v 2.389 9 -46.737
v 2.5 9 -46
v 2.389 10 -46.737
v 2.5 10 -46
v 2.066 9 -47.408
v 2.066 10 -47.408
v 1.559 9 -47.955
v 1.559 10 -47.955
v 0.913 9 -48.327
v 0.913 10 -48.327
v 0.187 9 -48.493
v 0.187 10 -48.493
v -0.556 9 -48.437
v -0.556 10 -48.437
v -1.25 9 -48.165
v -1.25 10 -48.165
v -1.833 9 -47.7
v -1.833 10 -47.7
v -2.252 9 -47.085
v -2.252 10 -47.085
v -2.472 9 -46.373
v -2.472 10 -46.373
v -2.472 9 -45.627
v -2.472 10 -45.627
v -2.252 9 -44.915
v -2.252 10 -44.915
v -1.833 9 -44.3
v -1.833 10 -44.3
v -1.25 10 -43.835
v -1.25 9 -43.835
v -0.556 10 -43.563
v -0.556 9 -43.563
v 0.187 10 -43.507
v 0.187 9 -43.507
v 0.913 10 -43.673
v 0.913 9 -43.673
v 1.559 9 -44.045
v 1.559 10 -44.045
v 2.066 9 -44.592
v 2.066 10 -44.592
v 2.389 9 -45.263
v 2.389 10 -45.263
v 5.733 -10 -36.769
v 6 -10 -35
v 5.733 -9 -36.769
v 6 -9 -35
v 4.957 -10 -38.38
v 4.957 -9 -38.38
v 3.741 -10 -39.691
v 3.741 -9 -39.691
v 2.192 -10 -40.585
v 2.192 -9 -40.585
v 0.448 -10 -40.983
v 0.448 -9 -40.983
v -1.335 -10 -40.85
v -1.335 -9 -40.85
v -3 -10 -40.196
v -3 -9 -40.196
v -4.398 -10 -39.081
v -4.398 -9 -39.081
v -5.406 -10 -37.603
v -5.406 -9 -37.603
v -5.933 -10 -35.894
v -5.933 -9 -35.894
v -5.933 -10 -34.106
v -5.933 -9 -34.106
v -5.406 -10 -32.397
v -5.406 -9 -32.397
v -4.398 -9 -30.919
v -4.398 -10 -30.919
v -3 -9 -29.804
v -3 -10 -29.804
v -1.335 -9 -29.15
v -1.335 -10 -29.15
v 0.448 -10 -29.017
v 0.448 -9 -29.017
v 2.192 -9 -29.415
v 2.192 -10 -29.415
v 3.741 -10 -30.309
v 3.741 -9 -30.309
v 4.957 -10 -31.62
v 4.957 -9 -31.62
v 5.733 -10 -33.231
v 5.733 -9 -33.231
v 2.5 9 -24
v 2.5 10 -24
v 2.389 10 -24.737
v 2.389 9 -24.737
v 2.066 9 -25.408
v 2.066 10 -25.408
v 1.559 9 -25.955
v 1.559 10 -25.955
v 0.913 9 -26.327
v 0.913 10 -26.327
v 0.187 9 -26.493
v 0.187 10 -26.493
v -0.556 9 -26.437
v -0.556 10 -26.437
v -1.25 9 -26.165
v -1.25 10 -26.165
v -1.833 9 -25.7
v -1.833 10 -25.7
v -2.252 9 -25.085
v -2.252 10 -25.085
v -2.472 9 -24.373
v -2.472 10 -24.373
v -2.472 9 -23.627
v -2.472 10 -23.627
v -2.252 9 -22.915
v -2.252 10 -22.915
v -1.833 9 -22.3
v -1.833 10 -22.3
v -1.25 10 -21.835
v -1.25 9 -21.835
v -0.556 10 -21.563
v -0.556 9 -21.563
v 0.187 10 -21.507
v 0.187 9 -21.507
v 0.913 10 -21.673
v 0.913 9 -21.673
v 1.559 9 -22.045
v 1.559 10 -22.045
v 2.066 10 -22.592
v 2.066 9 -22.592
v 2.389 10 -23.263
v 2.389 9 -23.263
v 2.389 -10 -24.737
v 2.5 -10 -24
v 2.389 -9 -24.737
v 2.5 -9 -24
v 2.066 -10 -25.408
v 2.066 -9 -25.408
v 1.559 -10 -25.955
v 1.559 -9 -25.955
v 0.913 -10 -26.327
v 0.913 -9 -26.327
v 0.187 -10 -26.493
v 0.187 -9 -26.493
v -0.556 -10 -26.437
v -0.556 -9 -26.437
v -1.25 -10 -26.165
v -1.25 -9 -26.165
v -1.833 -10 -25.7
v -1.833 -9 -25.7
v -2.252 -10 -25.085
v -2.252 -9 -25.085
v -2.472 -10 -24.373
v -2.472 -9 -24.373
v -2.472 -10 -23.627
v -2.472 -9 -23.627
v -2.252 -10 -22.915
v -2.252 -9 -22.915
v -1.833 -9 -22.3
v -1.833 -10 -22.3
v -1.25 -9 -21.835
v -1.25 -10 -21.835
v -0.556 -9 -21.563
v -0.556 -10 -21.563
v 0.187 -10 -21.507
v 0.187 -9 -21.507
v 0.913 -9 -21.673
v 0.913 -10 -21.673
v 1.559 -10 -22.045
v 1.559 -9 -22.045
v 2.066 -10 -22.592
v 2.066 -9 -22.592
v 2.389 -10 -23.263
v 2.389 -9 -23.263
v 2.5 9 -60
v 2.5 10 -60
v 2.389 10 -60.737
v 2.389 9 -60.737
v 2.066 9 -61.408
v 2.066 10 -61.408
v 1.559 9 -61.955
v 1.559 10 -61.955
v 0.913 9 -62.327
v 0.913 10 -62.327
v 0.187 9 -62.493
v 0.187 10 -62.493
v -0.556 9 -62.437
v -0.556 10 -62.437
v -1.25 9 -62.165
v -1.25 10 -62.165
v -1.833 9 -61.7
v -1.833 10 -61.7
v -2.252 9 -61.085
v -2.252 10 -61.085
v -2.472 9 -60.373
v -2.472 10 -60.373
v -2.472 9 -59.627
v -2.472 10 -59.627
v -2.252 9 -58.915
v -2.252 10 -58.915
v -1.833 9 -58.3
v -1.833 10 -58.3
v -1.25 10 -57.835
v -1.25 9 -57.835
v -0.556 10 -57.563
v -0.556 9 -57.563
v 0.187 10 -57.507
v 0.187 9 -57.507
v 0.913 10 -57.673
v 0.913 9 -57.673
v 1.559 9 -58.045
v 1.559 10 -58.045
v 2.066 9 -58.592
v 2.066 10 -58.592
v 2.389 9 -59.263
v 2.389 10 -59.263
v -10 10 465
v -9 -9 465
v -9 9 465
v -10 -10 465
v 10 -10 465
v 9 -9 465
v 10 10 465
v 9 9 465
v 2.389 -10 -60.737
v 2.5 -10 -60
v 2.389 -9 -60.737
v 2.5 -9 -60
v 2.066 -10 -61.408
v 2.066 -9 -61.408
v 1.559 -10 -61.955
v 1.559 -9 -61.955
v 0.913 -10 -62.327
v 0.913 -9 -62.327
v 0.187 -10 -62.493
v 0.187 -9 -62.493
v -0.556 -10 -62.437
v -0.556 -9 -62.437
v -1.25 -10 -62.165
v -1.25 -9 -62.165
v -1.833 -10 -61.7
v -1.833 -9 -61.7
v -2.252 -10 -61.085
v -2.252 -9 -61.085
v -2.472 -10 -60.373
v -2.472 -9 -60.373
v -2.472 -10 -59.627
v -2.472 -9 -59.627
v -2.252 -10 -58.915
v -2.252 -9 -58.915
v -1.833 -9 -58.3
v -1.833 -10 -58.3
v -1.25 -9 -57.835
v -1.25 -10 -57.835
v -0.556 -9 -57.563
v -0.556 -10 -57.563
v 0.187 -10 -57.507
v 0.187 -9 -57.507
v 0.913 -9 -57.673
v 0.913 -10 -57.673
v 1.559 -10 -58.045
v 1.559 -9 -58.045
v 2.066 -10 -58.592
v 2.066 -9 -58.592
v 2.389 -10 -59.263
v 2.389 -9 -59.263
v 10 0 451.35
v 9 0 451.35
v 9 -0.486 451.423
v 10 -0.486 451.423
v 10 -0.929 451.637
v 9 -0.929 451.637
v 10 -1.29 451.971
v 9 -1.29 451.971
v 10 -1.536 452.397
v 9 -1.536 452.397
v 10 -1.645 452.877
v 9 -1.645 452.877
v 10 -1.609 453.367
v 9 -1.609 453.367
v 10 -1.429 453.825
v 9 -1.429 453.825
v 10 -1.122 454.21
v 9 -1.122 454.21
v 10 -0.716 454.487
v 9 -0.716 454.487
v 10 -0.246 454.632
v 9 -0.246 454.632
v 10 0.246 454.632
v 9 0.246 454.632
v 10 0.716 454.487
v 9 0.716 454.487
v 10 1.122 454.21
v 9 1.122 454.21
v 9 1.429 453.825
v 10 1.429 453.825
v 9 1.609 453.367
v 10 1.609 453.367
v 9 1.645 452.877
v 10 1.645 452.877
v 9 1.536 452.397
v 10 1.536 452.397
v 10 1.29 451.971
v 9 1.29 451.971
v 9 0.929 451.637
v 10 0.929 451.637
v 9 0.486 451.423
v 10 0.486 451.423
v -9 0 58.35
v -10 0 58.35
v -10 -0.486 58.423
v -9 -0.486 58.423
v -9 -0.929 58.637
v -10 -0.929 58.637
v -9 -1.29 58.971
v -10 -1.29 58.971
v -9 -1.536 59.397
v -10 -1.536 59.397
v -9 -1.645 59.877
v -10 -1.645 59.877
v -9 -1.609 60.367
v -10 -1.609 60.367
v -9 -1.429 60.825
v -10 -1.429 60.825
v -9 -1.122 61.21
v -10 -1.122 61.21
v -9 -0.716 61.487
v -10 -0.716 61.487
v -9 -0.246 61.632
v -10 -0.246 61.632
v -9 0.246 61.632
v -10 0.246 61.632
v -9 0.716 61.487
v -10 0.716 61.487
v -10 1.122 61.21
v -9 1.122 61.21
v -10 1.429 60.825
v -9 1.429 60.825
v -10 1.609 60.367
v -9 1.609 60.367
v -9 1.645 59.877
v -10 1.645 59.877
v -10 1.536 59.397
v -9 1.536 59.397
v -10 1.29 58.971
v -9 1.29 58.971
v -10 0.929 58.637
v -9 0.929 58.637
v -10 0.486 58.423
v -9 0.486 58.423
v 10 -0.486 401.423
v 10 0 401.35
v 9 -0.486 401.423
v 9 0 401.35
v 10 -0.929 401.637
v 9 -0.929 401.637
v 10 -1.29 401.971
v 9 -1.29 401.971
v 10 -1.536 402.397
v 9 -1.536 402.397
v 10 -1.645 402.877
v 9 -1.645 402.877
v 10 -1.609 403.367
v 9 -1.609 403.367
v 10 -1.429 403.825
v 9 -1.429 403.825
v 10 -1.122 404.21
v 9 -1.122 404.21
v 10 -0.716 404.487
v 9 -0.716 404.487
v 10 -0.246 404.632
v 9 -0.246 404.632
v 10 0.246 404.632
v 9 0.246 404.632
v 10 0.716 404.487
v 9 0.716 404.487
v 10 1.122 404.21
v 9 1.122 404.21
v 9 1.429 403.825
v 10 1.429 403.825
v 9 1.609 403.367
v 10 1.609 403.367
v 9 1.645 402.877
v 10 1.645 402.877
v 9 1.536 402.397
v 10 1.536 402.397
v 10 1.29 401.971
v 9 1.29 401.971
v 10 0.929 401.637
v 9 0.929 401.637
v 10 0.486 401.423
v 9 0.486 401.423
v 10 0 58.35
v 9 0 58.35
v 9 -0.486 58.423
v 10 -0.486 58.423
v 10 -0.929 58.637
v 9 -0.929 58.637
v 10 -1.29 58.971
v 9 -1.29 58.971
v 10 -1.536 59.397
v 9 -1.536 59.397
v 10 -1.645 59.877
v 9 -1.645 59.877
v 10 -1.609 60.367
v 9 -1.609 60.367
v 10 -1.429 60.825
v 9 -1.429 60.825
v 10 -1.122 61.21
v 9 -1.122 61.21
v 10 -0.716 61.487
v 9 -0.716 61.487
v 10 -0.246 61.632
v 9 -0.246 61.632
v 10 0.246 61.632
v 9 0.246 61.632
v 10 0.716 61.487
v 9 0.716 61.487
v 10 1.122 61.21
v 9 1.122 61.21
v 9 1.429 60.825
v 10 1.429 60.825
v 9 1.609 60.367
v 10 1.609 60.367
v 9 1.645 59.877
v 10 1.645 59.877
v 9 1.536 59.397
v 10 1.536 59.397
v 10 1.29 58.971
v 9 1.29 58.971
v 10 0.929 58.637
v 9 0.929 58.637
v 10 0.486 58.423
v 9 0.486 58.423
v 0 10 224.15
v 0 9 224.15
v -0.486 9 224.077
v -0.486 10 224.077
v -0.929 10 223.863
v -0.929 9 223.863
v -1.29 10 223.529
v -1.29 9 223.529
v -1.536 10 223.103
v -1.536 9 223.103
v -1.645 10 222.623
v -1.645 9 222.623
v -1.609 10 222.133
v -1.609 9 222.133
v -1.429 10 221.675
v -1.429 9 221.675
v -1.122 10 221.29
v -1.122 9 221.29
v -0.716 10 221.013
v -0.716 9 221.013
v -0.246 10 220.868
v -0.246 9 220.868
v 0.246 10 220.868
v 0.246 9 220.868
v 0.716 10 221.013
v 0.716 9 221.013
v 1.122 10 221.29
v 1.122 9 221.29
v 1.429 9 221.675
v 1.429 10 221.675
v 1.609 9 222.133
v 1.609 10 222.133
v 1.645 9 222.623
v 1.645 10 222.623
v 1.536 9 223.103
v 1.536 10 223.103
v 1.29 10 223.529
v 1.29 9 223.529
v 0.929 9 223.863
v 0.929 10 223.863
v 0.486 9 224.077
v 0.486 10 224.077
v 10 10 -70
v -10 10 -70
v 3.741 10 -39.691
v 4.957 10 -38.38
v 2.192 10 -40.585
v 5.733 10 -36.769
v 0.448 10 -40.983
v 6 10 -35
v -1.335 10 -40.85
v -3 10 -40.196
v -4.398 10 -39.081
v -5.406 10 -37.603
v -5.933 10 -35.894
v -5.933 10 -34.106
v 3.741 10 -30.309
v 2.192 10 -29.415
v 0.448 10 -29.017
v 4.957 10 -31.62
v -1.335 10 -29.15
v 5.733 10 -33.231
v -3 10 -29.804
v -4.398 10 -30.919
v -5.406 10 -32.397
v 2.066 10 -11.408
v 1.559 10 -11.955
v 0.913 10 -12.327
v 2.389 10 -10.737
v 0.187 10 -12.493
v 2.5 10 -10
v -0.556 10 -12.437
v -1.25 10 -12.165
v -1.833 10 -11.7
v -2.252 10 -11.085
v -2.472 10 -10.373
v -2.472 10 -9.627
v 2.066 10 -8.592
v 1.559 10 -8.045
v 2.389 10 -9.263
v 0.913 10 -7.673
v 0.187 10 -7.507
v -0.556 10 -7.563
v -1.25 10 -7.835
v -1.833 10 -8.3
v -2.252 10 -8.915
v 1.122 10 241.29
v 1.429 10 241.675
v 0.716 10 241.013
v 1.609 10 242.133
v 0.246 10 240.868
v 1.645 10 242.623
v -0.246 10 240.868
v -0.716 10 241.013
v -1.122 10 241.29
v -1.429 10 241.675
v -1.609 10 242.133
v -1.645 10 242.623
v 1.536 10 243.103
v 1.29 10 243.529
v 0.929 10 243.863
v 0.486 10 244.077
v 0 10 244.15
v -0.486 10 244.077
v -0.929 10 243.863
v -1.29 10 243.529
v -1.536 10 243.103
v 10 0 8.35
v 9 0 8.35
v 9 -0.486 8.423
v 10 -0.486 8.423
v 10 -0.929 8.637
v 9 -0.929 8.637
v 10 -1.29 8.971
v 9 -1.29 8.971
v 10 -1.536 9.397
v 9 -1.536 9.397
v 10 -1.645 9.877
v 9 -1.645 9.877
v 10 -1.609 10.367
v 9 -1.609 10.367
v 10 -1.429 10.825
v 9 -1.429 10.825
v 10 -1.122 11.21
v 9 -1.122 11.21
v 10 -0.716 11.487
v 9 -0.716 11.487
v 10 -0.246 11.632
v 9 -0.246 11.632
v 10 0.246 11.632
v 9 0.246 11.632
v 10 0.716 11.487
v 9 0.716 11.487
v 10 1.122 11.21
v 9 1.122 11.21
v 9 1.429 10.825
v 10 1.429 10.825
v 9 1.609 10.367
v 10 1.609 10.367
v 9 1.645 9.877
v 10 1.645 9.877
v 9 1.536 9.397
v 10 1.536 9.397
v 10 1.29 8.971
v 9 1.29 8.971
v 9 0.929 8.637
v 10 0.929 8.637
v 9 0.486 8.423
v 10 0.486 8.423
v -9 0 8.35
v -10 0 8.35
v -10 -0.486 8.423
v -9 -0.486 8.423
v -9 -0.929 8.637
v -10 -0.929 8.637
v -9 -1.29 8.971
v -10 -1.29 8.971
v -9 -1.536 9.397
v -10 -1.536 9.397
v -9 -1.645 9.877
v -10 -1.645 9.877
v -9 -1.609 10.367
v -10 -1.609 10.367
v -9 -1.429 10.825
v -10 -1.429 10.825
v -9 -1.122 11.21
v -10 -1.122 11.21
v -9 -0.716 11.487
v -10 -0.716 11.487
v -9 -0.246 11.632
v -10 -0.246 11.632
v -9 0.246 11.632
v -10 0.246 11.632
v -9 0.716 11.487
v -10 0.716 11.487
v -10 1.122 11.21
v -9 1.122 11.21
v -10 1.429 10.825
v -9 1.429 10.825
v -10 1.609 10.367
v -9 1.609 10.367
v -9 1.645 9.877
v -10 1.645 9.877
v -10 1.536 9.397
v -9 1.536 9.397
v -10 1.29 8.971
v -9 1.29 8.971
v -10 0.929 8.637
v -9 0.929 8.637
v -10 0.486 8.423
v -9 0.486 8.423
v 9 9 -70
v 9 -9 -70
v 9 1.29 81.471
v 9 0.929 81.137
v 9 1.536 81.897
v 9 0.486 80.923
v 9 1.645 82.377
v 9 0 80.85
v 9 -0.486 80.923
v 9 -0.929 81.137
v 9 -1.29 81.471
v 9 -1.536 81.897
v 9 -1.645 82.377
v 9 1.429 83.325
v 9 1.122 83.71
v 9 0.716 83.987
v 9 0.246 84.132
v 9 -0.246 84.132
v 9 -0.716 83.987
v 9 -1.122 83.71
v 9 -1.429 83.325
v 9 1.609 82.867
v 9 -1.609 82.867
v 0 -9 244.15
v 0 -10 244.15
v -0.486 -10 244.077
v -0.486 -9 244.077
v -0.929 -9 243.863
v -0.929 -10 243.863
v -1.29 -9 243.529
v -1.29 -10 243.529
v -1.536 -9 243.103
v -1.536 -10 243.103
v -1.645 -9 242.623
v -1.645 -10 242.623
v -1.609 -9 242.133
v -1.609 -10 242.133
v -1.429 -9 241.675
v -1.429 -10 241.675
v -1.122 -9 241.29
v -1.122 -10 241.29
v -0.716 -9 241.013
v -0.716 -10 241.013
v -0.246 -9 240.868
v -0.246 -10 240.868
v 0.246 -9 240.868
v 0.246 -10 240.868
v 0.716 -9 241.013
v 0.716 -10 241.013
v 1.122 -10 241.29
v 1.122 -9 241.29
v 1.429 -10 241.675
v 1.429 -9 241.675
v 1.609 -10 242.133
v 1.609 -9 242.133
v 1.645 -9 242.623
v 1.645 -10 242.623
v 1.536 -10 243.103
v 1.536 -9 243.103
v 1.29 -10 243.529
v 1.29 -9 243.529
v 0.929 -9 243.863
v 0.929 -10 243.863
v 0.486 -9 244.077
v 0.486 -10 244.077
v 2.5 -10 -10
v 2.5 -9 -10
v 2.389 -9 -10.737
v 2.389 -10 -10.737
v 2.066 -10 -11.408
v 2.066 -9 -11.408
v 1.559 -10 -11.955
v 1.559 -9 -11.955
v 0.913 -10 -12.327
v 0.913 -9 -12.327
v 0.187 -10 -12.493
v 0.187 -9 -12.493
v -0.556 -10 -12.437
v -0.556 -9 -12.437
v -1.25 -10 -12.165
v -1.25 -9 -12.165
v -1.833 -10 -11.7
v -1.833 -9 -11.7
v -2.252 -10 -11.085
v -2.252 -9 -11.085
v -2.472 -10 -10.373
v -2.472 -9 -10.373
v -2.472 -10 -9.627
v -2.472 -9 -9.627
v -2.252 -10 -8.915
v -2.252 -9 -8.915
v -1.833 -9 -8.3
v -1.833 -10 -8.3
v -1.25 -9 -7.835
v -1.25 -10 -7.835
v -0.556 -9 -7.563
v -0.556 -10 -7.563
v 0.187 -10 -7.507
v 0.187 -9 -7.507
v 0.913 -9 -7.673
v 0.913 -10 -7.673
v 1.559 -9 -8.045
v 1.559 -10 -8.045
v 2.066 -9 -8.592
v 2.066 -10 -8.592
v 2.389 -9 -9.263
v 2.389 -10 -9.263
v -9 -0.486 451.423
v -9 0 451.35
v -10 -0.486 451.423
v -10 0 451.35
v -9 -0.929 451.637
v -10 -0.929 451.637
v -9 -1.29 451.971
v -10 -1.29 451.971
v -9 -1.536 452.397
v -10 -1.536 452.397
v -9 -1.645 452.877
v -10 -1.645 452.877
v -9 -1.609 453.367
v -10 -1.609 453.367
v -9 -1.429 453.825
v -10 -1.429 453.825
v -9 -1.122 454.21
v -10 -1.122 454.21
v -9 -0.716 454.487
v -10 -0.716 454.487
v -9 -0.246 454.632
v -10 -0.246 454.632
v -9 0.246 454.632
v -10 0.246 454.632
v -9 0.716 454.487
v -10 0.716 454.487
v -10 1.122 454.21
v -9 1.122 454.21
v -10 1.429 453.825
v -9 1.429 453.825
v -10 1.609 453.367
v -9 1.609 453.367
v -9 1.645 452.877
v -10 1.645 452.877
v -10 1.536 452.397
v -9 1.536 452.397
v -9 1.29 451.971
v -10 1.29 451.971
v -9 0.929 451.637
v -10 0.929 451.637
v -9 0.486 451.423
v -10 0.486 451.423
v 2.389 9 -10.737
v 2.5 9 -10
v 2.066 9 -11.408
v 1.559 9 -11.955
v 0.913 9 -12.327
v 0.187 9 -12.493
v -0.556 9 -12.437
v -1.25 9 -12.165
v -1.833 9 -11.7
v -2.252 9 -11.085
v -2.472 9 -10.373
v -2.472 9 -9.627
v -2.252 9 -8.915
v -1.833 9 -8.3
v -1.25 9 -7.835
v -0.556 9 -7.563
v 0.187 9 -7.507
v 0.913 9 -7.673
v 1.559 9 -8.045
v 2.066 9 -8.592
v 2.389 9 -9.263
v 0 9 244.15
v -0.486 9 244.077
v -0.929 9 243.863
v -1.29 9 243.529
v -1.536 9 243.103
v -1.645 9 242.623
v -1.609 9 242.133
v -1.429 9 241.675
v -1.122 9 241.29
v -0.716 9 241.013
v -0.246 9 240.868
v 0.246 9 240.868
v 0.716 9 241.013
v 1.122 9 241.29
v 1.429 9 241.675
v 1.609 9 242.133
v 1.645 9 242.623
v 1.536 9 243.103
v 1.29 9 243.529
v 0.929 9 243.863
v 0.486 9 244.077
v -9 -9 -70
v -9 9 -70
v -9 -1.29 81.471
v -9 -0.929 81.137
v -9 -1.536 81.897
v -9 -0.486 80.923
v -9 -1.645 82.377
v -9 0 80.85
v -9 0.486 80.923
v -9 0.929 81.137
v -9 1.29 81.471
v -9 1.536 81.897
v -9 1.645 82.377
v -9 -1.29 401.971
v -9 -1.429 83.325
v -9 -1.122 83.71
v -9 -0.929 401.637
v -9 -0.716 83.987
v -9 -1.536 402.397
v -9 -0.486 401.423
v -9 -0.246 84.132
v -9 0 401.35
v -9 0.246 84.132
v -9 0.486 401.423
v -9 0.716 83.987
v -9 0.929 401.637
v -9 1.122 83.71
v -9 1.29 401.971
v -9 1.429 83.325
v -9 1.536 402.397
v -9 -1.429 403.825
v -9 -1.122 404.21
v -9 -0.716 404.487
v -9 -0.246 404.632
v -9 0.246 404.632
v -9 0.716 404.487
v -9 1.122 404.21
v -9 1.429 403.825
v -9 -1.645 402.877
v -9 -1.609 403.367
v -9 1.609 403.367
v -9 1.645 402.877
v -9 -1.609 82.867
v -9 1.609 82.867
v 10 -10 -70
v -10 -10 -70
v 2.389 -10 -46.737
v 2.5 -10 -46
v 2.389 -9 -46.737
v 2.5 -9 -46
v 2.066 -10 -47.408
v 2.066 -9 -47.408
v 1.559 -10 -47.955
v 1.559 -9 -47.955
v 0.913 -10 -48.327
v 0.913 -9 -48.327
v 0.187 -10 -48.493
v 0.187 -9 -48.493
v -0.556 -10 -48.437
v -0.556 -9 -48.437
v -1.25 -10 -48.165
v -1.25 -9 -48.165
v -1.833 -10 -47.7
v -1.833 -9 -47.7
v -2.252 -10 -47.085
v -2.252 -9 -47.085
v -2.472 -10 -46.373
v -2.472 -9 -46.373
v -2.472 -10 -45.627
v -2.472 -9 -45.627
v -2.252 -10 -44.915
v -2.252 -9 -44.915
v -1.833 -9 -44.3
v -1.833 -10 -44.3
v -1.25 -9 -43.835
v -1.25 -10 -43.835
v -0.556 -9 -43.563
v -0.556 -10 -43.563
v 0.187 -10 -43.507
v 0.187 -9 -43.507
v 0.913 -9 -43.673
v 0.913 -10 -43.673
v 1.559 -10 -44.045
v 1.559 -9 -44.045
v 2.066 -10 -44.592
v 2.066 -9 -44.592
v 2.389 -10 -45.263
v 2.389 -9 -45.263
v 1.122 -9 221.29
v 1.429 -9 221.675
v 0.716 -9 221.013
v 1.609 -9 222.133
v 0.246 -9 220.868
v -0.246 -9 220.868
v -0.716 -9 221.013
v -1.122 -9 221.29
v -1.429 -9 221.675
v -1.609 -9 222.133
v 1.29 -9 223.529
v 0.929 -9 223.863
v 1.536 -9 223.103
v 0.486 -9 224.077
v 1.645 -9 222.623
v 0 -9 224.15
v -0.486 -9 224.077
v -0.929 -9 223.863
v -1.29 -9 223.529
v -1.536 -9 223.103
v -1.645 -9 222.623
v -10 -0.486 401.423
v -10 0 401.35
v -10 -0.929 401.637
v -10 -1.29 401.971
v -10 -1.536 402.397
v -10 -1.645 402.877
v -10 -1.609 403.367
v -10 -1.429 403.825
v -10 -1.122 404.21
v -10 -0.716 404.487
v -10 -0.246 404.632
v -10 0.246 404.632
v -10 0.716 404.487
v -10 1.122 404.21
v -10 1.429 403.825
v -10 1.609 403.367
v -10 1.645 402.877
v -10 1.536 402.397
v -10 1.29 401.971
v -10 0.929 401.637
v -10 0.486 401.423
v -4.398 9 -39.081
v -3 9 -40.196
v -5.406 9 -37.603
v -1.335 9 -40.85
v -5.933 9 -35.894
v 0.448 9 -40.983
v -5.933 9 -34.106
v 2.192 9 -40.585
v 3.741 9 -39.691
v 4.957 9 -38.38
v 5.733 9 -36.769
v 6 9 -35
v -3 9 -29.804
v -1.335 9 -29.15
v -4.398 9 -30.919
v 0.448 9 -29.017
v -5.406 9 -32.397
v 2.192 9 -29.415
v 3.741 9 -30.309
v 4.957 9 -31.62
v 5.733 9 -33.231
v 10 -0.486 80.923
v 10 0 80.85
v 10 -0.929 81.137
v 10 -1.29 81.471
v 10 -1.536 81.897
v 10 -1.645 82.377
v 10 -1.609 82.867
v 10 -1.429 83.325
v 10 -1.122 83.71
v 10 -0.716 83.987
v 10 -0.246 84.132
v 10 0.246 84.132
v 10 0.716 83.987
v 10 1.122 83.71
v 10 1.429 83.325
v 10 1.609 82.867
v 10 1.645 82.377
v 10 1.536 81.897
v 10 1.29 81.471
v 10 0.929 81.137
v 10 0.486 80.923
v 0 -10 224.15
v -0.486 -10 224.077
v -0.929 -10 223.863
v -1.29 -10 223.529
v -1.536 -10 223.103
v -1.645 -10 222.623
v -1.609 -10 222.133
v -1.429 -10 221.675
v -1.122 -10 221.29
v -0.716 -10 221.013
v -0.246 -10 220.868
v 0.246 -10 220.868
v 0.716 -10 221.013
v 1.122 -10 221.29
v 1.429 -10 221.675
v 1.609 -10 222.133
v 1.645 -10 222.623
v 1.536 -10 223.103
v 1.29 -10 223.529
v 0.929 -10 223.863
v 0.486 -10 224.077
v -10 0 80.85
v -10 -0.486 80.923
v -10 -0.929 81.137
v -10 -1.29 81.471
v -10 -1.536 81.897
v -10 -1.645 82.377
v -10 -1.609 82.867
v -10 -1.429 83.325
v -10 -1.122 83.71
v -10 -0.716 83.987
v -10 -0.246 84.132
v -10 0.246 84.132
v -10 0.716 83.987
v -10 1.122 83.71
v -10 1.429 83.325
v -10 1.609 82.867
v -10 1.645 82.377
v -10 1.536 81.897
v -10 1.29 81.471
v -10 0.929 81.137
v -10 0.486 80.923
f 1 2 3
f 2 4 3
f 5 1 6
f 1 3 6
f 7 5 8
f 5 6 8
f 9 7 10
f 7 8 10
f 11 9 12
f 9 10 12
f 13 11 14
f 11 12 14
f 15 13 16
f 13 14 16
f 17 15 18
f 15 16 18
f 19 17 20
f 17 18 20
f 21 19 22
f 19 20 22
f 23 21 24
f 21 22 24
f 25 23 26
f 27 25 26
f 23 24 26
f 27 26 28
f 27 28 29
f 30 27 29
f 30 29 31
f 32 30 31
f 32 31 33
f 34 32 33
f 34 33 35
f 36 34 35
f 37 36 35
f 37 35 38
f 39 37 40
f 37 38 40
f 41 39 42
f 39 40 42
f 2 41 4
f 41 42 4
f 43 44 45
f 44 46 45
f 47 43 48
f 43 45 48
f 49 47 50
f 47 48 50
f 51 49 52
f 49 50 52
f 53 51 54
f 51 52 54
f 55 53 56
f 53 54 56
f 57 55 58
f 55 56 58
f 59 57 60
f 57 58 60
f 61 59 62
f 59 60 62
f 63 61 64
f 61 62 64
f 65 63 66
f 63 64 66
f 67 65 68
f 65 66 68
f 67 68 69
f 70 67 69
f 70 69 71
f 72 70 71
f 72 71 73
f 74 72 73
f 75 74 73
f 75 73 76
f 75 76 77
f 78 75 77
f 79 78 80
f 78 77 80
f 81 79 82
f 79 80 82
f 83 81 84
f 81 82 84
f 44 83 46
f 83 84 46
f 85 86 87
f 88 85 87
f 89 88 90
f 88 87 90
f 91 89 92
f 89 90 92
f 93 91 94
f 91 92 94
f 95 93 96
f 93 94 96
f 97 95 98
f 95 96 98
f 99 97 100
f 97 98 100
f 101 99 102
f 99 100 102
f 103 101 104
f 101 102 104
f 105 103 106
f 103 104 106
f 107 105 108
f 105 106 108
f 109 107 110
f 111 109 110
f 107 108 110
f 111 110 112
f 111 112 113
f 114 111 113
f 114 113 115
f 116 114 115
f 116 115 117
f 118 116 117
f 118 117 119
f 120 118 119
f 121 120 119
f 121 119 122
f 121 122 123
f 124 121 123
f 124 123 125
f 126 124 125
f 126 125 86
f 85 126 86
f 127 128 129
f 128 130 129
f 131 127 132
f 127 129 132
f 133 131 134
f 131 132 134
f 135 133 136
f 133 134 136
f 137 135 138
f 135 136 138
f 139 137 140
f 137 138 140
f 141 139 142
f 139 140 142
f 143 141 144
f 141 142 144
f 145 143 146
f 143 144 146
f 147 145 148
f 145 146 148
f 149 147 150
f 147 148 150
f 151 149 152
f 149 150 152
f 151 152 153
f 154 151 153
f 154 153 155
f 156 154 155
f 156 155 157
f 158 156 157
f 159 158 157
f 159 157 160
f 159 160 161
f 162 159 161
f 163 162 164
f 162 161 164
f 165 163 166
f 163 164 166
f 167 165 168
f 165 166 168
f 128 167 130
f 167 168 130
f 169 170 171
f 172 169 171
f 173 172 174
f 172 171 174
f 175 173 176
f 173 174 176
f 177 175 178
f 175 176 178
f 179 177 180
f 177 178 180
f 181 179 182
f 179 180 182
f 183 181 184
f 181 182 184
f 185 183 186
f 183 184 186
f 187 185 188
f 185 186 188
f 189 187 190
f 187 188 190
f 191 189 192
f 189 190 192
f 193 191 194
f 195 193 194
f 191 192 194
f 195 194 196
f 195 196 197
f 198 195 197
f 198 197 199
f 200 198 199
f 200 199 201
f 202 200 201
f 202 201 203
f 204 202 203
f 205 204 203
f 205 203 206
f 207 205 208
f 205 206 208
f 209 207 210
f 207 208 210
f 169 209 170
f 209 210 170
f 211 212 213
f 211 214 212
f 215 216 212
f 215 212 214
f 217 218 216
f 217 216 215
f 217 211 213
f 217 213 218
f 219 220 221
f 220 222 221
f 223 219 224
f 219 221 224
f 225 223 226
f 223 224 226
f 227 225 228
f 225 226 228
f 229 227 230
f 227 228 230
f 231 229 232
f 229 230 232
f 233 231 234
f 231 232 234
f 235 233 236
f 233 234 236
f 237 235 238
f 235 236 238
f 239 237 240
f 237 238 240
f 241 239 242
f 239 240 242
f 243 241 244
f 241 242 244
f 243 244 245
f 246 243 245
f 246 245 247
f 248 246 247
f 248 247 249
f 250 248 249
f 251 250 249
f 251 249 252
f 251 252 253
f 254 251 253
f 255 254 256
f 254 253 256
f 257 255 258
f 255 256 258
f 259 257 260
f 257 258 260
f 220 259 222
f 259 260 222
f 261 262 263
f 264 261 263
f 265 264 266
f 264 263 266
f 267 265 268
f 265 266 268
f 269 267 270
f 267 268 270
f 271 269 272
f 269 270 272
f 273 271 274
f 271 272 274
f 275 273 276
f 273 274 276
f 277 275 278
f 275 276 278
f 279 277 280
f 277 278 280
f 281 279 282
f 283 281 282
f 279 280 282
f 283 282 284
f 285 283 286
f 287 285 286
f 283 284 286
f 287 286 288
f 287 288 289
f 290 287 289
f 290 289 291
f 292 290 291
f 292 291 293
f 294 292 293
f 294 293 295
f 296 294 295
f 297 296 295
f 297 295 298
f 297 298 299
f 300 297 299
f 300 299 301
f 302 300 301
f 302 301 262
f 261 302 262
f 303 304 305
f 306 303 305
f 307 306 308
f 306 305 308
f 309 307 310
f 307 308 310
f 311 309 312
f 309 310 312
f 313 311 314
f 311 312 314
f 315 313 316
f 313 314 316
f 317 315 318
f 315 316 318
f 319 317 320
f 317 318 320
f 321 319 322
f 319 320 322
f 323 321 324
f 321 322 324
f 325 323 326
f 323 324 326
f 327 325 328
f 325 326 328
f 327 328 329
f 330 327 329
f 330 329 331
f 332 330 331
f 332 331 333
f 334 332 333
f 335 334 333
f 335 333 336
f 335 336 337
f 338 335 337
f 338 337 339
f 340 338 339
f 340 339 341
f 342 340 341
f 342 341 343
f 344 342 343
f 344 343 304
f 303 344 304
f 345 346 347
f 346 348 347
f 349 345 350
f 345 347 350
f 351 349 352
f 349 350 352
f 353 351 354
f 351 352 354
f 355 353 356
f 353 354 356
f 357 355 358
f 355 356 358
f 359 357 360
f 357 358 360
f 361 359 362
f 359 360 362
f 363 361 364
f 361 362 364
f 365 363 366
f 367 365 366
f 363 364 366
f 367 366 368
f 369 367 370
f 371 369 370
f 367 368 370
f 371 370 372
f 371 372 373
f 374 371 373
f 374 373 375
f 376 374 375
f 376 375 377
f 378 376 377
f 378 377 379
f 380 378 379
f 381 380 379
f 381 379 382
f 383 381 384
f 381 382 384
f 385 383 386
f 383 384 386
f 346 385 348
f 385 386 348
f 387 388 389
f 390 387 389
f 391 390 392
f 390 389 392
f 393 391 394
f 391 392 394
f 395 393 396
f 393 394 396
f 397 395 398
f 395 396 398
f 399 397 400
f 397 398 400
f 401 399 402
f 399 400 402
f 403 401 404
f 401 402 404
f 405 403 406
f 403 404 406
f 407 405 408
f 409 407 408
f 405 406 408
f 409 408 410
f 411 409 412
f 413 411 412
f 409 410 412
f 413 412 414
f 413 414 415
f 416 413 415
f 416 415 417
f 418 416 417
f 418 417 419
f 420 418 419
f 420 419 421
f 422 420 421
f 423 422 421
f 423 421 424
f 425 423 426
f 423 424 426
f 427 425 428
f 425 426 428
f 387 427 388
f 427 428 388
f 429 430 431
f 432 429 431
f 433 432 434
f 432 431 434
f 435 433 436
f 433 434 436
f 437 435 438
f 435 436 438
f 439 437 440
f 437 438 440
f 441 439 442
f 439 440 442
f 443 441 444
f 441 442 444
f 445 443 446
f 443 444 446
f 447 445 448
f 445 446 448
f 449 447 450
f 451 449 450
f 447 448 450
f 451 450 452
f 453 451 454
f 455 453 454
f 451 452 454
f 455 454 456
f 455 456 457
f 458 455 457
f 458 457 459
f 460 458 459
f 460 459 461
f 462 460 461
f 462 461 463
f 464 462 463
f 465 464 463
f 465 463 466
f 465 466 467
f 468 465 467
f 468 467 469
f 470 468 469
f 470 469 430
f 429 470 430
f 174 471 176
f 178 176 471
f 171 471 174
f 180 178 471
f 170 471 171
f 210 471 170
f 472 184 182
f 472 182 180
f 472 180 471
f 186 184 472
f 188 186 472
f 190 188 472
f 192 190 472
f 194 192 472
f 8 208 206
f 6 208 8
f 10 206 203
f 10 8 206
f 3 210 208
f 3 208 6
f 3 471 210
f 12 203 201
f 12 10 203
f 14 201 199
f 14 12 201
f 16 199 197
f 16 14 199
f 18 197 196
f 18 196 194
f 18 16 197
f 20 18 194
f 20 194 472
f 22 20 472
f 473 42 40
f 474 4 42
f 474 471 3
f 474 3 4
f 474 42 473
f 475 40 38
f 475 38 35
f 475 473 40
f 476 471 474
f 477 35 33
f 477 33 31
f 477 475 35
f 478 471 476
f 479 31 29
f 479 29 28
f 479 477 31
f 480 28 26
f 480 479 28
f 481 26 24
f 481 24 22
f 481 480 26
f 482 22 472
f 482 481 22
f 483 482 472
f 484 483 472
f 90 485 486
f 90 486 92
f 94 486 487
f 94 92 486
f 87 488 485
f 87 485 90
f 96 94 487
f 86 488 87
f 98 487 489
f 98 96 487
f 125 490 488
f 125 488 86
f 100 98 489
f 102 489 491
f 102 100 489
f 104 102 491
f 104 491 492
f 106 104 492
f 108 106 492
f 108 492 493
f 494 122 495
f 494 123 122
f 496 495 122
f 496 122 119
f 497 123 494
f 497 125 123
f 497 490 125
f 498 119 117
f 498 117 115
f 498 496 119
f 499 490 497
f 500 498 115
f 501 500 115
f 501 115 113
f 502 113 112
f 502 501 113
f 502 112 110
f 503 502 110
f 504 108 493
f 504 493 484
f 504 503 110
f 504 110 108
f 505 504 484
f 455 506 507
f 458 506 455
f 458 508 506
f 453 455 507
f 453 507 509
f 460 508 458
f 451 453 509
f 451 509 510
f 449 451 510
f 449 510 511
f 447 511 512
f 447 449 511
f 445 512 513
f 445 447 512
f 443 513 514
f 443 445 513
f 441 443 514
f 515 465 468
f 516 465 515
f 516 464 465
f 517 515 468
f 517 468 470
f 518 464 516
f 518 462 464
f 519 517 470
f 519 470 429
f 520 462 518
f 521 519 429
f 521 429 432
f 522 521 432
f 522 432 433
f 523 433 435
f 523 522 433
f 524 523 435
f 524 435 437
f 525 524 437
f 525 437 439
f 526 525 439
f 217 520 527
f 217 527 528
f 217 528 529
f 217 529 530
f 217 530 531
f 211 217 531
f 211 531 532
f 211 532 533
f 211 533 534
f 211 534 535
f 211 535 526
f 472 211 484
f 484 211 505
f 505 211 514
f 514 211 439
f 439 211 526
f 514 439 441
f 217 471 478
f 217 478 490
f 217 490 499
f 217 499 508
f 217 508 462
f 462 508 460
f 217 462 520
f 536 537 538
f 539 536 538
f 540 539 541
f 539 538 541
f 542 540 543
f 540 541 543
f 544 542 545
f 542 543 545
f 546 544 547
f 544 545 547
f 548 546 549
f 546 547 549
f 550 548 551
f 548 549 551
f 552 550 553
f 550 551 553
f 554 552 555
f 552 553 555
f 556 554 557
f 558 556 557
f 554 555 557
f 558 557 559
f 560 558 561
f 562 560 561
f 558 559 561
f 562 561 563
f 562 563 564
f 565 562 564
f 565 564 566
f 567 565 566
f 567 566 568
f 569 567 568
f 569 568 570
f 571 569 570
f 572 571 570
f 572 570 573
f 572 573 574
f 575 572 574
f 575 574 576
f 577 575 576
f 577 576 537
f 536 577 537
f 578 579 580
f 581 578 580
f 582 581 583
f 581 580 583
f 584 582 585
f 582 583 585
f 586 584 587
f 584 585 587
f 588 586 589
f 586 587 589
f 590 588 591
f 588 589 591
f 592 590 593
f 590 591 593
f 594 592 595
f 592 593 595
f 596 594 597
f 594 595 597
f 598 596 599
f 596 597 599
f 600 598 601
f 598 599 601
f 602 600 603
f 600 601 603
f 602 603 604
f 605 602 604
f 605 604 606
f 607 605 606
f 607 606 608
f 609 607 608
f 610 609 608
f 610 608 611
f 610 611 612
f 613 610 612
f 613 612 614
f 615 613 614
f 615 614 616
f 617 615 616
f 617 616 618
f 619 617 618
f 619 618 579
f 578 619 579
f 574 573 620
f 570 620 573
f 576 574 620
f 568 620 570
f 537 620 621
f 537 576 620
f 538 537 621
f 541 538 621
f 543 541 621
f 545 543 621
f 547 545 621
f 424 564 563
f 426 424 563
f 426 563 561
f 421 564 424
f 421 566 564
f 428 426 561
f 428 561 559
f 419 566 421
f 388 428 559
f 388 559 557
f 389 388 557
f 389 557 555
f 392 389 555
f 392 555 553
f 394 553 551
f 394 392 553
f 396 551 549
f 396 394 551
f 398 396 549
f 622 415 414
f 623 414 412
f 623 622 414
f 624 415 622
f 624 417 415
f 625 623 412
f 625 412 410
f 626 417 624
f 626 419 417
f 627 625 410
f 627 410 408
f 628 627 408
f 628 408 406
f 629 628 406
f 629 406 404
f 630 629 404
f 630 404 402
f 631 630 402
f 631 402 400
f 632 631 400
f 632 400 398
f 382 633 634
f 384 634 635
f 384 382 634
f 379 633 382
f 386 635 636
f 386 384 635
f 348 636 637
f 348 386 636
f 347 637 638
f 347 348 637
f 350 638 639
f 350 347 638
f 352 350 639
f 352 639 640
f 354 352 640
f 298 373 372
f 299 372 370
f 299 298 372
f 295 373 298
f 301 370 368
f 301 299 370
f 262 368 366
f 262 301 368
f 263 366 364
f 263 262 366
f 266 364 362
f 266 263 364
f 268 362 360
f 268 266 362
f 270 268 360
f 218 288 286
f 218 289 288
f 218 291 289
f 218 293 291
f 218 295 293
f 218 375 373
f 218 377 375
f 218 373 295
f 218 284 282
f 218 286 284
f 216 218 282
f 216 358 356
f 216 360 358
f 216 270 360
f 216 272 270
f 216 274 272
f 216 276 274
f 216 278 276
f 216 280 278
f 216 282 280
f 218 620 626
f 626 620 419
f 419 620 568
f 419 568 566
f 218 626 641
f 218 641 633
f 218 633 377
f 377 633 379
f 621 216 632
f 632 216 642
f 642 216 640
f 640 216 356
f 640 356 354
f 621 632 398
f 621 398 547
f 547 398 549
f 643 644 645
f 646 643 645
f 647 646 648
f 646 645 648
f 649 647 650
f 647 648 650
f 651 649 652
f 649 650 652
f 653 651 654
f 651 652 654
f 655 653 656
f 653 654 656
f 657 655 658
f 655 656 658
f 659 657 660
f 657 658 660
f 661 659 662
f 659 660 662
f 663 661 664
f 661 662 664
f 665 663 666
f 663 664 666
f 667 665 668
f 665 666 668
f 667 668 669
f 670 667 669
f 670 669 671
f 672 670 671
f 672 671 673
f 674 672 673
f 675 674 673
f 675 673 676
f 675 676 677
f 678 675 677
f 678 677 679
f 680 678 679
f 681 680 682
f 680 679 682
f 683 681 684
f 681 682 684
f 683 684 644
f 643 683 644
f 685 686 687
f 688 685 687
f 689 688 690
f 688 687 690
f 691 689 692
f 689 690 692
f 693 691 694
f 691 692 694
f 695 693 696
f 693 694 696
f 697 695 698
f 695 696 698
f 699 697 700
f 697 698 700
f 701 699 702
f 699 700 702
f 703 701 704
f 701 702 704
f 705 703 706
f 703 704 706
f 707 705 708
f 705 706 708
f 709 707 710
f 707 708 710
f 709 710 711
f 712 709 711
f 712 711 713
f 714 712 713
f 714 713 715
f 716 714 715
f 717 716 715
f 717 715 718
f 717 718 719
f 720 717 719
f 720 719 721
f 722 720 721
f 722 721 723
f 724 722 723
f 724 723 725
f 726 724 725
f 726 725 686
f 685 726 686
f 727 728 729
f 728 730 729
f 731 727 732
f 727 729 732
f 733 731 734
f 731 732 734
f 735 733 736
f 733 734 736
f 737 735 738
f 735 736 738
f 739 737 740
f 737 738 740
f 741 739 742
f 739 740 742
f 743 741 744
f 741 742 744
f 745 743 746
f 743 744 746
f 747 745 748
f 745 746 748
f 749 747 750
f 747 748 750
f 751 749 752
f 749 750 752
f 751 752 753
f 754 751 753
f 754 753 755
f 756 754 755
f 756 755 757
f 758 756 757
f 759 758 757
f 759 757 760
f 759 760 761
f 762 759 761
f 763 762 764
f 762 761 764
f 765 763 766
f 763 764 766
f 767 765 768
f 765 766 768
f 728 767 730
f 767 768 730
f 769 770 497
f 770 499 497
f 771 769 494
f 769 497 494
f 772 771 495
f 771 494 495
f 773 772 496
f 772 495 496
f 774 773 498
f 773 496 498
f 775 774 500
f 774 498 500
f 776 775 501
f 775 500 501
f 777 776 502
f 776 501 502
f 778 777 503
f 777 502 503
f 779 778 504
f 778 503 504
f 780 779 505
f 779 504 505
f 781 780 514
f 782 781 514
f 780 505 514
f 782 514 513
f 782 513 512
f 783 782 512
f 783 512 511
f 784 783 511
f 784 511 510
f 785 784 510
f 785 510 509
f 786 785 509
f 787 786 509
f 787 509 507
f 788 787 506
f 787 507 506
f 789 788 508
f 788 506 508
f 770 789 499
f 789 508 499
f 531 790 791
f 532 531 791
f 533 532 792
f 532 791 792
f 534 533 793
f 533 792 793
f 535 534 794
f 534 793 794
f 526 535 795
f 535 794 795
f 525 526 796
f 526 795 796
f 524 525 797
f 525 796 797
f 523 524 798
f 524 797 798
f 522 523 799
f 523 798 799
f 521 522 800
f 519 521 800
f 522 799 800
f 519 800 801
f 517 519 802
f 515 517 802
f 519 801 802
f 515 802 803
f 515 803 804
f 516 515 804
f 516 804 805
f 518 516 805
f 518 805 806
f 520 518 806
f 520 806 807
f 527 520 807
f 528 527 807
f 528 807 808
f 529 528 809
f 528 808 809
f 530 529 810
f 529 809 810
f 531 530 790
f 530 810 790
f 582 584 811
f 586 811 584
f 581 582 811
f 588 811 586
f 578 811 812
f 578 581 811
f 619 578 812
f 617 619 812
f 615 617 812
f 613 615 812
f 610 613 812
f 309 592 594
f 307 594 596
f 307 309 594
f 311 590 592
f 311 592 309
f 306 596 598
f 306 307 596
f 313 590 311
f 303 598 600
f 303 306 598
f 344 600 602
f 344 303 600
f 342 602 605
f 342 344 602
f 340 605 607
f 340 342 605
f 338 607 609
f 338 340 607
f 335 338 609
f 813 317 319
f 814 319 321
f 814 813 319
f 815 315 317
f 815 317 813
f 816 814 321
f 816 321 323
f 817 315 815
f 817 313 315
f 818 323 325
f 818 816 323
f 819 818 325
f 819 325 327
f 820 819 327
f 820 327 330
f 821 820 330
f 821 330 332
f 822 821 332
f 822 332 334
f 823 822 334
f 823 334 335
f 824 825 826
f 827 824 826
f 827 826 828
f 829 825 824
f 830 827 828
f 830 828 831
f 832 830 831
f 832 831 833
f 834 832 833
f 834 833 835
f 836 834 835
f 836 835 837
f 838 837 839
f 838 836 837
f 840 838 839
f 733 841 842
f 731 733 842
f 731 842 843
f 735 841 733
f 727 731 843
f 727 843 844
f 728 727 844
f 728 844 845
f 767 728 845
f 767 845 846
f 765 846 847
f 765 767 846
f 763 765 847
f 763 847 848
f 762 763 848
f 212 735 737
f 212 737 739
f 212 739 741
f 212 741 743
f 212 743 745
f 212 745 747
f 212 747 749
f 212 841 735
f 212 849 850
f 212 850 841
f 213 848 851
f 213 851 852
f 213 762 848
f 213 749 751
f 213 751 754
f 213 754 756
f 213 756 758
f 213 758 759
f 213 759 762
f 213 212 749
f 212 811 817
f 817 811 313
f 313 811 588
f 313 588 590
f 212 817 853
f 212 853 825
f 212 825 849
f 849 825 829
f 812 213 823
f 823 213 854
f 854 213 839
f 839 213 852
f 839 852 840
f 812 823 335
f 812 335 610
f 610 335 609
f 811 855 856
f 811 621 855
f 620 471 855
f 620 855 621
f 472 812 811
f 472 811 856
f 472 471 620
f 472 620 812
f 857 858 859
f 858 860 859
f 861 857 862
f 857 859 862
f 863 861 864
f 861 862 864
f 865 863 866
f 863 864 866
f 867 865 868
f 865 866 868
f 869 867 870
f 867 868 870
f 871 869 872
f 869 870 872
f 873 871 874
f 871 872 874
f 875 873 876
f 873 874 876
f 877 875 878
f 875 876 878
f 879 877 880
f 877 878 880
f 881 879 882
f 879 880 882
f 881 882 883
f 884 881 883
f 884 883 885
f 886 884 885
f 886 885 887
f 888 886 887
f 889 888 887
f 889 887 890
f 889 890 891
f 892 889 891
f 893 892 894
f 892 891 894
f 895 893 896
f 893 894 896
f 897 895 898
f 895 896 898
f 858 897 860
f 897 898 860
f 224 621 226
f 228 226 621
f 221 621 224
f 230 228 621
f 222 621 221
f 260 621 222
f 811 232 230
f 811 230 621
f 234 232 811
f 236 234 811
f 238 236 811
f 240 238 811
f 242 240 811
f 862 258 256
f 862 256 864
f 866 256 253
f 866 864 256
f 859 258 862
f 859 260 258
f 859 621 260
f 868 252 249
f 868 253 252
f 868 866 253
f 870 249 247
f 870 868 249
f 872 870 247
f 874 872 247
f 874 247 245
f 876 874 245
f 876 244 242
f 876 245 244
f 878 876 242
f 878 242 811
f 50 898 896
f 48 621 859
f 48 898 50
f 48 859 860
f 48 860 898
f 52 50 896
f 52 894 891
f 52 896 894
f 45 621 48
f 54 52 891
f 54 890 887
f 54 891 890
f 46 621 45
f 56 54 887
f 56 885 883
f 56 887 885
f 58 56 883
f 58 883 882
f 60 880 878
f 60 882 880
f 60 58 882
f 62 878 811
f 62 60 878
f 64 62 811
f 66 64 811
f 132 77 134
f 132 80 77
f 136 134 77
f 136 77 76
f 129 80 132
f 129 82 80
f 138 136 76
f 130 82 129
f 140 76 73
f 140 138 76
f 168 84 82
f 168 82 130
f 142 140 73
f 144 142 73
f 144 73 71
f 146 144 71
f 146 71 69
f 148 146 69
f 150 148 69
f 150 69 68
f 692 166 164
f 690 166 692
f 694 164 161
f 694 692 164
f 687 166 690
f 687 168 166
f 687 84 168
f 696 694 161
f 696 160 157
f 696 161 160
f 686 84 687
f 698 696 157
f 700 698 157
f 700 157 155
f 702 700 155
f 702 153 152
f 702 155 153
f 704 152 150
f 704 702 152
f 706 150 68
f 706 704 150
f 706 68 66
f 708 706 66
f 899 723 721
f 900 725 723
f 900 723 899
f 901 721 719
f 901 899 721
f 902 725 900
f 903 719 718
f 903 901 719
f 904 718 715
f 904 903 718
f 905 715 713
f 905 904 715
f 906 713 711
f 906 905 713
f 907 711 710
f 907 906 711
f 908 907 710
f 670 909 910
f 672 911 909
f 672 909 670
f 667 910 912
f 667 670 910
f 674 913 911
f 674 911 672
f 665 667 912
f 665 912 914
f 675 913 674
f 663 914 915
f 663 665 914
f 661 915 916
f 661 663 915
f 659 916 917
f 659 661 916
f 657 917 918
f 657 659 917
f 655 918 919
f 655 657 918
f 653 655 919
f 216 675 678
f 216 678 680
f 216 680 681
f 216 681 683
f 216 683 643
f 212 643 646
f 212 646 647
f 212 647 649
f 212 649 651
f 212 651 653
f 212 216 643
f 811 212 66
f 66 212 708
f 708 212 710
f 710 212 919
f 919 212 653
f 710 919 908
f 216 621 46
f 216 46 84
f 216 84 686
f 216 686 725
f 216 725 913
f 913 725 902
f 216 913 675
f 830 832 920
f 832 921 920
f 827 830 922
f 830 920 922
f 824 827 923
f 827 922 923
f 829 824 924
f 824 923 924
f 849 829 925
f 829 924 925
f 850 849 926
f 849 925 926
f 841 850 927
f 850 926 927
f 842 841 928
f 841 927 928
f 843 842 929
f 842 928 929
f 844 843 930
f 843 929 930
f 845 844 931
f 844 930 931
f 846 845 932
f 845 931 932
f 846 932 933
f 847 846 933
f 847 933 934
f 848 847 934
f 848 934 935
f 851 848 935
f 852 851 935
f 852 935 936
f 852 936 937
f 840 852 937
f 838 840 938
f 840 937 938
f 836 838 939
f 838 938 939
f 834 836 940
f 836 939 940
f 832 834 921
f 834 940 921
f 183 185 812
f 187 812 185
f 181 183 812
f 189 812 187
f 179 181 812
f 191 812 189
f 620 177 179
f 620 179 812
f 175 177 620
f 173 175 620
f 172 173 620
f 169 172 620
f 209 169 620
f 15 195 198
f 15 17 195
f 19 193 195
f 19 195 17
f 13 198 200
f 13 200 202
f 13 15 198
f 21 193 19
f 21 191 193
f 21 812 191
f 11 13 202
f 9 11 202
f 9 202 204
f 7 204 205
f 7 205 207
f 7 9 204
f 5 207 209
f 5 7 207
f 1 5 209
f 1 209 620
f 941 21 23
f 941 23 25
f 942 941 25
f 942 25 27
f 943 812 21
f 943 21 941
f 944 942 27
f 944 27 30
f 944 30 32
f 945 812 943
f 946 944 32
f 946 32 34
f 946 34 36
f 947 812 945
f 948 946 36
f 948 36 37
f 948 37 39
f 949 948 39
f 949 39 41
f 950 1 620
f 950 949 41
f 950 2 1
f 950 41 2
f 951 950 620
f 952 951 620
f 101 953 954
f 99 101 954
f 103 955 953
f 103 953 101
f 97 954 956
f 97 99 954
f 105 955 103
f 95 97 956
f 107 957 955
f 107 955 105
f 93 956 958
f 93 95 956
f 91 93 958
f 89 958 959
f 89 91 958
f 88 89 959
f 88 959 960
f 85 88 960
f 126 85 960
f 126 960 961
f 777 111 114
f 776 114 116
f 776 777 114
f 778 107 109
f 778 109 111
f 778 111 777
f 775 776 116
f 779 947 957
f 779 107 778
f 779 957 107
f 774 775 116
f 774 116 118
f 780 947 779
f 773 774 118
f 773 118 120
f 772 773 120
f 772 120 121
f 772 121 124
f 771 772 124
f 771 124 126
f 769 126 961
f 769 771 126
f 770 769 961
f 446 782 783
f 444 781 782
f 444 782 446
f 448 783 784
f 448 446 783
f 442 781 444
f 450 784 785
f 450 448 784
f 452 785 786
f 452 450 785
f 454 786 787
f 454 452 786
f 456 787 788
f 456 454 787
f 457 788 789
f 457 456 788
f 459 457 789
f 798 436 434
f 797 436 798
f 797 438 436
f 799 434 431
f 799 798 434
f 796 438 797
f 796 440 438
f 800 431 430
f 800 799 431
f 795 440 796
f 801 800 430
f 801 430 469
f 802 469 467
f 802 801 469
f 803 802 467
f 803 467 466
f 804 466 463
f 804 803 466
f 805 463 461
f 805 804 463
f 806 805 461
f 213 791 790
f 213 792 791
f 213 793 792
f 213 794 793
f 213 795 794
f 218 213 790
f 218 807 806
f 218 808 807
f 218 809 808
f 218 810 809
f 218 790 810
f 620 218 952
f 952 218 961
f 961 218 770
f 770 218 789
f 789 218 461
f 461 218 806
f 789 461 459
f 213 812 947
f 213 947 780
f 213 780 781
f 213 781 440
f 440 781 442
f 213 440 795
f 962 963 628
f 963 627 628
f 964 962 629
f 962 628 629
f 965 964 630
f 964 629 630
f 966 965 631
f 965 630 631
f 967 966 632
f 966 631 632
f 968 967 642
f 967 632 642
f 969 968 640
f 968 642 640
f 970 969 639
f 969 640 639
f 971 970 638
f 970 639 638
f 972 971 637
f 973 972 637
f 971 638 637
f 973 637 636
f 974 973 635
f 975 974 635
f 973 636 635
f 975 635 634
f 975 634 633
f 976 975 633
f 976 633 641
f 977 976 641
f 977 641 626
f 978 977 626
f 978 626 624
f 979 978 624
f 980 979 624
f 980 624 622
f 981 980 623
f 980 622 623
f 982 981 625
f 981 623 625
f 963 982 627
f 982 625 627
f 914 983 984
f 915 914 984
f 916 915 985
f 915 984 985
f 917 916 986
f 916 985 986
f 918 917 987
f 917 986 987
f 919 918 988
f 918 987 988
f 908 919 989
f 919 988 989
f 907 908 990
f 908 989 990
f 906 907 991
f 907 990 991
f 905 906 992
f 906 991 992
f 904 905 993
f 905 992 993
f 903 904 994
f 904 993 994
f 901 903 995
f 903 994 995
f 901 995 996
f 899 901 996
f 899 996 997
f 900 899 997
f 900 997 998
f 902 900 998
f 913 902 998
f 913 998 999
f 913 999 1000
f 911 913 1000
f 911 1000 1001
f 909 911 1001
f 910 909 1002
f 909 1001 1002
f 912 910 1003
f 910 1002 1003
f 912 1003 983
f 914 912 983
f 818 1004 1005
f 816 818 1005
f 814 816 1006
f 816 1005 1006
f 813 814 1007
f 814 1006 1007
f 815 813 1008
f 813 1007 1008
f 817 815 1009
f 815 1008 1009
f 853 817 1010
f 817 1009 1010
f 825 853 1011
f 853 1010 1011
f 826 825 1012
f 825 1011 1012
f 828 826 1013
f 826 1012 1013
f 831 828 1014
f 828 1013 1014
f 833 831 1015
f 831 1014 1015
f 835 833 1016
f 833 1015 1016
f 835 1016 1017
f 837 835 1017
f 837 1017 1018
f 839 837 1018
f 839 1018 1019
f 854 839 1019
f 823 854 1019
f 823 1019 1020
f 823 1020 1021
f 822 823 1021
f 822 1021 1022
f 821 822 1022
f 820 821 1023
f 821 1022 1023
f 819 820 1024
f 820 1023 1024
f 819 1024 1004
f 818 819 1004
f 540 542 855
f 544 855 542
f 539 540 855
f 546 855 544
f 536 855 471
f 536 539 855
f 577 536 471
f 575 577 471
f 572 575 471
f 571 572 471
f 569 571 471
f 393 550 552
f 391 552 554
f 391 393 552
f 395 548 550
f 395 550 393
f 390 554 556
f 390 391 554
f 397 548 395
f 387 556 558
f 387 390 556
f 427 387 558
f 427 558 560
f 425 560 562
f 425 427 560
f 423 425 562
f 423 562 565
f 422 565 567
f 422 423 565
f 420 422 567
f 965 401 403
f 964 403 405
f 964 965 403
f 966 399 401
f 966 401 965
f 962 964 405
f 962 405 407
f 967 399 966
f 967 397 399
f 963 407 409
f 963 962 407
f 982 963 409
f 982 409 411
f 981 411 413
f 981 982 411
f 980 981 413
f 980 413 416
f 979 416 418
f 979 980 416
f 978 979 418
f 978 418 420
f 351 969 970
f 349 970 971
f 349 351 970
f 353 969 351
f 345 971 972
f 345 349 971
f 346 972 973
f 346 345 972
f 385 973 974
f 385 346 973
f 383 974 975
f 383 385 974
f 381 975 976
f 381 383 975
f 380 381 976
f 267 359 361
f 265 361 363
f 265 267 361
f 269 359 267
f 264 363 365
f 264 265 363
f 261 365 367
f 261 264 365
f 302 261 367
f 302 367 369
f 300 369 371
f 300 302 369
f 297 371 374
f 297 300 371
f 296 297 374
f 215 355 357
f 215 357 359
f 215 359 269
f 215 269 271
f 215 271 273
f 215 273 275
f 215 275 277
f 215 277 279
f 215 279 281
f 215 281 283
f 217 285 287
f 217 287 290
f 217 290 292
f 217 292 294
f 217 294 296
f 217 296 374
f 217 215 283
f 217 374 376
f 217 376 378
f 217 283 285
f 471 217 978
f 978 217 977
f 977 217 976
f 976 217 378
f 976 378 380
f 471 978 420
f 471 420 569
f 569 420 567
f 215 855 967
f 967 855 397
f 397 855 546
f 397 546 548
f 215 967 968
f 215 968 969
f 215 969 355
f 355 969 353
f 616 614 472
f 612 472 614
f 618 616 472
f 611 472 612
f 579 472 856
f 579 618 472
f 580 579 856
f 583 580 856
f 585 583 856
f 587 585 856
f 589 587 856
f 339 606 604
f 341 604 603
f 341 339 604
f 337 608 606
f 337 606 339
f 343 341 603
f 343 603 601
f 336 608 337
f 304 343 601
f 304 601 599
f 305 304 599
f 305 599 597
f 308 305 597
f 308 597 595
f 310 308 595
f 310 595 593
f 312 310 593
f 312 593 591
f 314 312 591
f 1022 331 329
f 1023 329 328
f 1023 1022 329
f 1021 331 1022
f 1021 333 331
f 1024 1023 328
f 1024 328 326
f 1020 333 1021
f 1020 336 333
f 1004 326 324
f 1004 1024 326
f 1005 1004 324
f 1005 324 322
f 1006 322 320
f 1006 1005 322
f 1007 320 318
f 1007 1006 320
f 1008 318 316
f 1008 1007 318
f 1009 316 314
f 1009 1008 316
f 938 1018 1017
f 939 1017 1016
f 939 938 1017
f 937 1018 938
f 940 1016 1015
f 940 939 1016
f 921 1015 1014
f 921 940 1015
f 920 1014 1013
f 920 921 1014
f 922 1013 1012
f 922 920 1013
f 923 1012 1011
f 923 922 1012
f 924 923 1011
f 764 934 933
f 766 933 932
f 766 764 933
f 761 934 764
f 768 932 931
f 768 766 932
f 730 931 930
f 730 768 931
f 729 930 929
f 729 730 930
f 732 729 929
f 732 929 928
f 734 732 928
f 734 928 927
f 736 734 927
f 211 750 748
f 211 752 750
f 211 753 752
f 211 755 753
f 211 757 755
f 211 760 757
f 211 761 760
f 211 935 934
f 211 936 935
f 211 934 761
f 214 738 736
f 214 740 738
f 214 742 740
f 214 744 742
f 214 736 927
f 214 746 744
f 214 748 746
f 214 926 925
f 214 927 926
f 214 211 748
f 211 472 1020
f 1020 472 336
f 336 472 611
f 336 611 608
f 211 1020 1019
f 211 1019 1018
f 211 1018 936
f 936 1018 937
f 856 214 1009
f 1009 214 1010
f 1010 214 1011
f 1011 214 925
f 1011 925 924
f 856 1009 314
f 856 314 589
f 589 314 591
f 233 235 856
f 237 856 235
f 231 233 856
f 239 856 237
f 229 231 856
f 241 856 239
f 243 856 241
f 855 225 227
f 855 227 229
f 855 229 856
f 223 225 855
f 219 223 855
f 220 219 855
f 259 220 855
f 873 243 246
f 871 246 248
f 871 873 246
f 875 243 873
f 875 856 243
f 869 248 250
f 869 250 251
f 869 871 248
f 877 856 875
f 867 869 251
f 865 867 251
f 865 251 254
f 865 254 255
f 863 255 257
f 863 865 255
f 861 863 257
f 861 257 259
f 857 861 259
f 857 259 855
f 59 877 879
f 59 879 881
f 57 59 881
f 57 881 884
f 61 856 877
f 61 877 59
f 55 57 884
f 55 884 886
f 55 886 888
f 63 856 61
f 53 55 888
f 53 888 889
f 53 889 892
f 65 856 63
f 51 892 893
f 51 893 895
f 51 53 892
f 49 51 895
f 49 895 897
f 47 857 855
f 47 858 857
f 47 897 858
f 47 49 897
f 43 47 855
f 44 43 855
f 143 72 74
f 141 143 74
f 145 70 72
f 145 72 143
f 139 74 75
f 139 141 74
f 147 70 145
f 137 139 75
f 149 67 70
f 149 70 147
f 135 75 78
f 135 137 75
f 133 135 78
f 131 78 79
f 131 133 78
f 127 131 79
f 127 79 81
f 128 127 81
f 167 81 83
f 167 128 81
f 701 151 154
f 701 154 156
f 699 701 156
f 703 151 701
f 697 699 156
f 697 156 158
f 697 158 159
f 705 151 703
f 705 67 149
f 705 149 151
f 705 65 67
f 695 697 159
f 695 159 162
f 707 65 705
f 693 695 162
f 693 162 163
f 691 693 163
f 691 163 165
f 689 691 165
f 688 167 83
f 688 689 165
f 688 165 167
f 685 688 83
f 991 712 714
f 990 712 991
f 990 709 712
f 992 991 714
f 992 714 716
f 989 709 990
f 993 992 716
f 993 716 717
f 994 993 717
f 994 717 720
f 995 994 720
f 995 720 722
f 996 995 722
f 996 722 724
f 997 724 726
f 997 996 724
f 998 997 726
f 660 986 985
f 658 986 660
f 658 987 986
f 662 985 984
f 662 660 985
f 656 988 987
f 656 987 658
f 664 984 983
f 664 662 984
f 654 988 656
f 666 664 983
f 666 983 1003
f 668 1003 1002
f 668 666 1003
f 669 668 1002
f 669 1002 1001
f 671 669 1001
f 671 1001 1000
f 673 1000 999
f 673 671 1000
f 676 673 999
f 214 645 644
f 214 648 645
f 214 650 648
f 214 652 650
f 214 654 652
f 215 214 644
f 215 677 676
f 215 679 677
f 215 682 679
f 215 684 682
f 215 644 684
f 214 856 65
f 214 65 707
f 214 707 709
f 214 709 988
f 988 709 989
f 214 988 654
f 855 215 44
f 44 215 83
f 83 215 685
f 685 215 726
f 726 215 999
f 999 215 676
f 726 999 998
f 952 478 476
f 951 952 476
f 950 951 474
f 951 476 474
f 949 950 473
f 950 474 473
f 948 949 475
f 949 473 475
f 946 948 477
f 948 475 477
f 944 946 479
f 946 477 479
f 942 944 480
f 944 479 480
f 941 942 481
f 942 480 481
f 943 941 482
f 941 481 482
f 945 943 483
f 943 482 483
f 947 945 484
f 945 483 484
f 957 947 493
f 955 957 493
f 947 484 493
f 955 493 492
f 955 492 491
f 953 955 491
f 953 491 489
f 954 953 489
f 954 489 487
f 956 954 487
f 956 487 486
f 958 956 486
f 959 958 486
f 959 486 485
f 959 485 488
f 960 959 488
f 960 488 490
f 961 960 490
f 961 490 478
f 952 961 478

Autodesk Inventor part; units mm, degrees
ref_plane "YZ Plane" through (0, 0, 0) normal (1, 0, 0) x (0, 1, 0)
ref_plane "XZ Plane" through (0, 0, 0) normal (0, 1, 0) x (-1, 0, 0)
ref_plane "XY Plane" through (0, 0, 0) normal (0, 0, 1) x (1, 0, 0)
sketch "スケッチ1" plane through (0, 0, 0) normal (0, 0, 1) x (1, 0, 0)
  line L0 (10, -10) -> (-10, -10)
  line L1 (-10, -10) -> (-10, 10)
  line L2 (-10, 10) -> (10, 10)
  line L3 (10, 10) -> (10, -10)
  line L4 (10, -10) -> (-10, 10) construction
  line L5 (-10, -10) -> (10, 10) construction
  line L6 (9, 9) -> (-9, 9)
  line L7 (-9, 9) -> (-9, -9)
  line L8 (-9, -9) -> (9, -9)
  line L9 (9, -9) -> (9, 9)
  point P0 (0, 0)
  dimension "d0" = 20
  dimension "d1" = 20
  dimension "d2" = 1
extrude "押し出し1" add sketch "スケッチ1" along normal blind 465
sketch "スケッチ2" plane through (10, -10, 0) normal (1, 0, 0) x (0, 0, -1)
  line L0 (0, 10) -> (-465, 10)
  line L1 (-465, 0) -> (-465, 20) projected
  line L2 (0, 0) -> (0, 20) projected
  point P0 (-403, 10)
  point P1 (-60, 10)
  point P2 (-10, 10)
  point P3 (-453, 10)
  point P4 (-82.5, 10)
  point P5 (-232.5, 10)
  dimension "d5" = 343
  dimension "d6" = 50
  dimension "d7" = 10
  dimension "d15" = 50
  dimension "d17" = 465
  dimension "d28" = 150
hole "穴1" at (10, 0, 403) at (10, 0, 60) at (10, 0, 10) at (10, 0, 453) at (10, 0, 82.5) direction (-1, 0, 0) diameter 3.3 end through all
sketch "スケッチ3" plane through (-10, 10, 0) normal (0, 1, 0) x (1, 0, 0)
  line L0 (10, 0) -> (10, -465)
  line L1 (20, -465) -> (0, -465) projected
  point P0 (10, -242.5)
  point P1 (10, -222.5)
  point P2 (10, -232.5)
  dimension "d19" = 20
  dimension "d20" = 10
hole "穴2" at (0, 10, 242.5) at (0, 10, 222.5) direction (0, -1, 0) diameter 3.3 end through all
sketch "スケッチ4" plane through (0, 0, 0) normal (0, 0, -1) x (-1, 0, 0)
  line L0 (-10, 10) -> (10, 10) projected
  line L1 (-10, -10) -> (-10, 10) projected
  line L2 (10, -10) -> (-10, -10) projected
  line L3 (10, 10) -> (10, -10) projected
  line L4 (-9, 9) -> (-9, -9) projected
  line L5 (9, 9) -> (-9, 9) projected
  line L6 (9, -9) -> (9, 9) projected
  line L7 (-9, -9) -> (9, -9) projected
  point P0 (0, 0)
extrude "押し出し2" add sketch "スケッチ4" along normal blind 70
sketch "スケッチ5" plane through (-10, 10, 465) normal (0, 1, 0) x (1, 0, 0)
  line L0 (10, 465) -> (10, 535)
  line L1 (1, 535) -> (19, 535) projected
  circle A0 centre (10, 475) radius 2.5
  circle A1 centre (10, 525) radius 2.5
  circle A2 centre (10, 489) radius 2.5
  circle A3 centre (10, 511) radius 2.5
  circle A4 centre (10, 500) radius 6
  dimension "d34" = 5
  dimension "d35" = 5
  dimension "d38" = 5
  dimension "d39" = 5
  dimension "d40" = 22
  dimension "d42" = 12
  dimension "d43" = 25
  dimension "d44" = 25
  dimension "d45" = 11
  dimension "d46" = 35
  dimension "d47" = 60
extrude "押し出し3" cut sketch "スケッチ5" against normal blind 70
equation "\"d35\" = d38"
equation "\"d39\" = d38"
equation "\"d45\" = 0.5 * d40"
properties part number "kaku_1010_530"
